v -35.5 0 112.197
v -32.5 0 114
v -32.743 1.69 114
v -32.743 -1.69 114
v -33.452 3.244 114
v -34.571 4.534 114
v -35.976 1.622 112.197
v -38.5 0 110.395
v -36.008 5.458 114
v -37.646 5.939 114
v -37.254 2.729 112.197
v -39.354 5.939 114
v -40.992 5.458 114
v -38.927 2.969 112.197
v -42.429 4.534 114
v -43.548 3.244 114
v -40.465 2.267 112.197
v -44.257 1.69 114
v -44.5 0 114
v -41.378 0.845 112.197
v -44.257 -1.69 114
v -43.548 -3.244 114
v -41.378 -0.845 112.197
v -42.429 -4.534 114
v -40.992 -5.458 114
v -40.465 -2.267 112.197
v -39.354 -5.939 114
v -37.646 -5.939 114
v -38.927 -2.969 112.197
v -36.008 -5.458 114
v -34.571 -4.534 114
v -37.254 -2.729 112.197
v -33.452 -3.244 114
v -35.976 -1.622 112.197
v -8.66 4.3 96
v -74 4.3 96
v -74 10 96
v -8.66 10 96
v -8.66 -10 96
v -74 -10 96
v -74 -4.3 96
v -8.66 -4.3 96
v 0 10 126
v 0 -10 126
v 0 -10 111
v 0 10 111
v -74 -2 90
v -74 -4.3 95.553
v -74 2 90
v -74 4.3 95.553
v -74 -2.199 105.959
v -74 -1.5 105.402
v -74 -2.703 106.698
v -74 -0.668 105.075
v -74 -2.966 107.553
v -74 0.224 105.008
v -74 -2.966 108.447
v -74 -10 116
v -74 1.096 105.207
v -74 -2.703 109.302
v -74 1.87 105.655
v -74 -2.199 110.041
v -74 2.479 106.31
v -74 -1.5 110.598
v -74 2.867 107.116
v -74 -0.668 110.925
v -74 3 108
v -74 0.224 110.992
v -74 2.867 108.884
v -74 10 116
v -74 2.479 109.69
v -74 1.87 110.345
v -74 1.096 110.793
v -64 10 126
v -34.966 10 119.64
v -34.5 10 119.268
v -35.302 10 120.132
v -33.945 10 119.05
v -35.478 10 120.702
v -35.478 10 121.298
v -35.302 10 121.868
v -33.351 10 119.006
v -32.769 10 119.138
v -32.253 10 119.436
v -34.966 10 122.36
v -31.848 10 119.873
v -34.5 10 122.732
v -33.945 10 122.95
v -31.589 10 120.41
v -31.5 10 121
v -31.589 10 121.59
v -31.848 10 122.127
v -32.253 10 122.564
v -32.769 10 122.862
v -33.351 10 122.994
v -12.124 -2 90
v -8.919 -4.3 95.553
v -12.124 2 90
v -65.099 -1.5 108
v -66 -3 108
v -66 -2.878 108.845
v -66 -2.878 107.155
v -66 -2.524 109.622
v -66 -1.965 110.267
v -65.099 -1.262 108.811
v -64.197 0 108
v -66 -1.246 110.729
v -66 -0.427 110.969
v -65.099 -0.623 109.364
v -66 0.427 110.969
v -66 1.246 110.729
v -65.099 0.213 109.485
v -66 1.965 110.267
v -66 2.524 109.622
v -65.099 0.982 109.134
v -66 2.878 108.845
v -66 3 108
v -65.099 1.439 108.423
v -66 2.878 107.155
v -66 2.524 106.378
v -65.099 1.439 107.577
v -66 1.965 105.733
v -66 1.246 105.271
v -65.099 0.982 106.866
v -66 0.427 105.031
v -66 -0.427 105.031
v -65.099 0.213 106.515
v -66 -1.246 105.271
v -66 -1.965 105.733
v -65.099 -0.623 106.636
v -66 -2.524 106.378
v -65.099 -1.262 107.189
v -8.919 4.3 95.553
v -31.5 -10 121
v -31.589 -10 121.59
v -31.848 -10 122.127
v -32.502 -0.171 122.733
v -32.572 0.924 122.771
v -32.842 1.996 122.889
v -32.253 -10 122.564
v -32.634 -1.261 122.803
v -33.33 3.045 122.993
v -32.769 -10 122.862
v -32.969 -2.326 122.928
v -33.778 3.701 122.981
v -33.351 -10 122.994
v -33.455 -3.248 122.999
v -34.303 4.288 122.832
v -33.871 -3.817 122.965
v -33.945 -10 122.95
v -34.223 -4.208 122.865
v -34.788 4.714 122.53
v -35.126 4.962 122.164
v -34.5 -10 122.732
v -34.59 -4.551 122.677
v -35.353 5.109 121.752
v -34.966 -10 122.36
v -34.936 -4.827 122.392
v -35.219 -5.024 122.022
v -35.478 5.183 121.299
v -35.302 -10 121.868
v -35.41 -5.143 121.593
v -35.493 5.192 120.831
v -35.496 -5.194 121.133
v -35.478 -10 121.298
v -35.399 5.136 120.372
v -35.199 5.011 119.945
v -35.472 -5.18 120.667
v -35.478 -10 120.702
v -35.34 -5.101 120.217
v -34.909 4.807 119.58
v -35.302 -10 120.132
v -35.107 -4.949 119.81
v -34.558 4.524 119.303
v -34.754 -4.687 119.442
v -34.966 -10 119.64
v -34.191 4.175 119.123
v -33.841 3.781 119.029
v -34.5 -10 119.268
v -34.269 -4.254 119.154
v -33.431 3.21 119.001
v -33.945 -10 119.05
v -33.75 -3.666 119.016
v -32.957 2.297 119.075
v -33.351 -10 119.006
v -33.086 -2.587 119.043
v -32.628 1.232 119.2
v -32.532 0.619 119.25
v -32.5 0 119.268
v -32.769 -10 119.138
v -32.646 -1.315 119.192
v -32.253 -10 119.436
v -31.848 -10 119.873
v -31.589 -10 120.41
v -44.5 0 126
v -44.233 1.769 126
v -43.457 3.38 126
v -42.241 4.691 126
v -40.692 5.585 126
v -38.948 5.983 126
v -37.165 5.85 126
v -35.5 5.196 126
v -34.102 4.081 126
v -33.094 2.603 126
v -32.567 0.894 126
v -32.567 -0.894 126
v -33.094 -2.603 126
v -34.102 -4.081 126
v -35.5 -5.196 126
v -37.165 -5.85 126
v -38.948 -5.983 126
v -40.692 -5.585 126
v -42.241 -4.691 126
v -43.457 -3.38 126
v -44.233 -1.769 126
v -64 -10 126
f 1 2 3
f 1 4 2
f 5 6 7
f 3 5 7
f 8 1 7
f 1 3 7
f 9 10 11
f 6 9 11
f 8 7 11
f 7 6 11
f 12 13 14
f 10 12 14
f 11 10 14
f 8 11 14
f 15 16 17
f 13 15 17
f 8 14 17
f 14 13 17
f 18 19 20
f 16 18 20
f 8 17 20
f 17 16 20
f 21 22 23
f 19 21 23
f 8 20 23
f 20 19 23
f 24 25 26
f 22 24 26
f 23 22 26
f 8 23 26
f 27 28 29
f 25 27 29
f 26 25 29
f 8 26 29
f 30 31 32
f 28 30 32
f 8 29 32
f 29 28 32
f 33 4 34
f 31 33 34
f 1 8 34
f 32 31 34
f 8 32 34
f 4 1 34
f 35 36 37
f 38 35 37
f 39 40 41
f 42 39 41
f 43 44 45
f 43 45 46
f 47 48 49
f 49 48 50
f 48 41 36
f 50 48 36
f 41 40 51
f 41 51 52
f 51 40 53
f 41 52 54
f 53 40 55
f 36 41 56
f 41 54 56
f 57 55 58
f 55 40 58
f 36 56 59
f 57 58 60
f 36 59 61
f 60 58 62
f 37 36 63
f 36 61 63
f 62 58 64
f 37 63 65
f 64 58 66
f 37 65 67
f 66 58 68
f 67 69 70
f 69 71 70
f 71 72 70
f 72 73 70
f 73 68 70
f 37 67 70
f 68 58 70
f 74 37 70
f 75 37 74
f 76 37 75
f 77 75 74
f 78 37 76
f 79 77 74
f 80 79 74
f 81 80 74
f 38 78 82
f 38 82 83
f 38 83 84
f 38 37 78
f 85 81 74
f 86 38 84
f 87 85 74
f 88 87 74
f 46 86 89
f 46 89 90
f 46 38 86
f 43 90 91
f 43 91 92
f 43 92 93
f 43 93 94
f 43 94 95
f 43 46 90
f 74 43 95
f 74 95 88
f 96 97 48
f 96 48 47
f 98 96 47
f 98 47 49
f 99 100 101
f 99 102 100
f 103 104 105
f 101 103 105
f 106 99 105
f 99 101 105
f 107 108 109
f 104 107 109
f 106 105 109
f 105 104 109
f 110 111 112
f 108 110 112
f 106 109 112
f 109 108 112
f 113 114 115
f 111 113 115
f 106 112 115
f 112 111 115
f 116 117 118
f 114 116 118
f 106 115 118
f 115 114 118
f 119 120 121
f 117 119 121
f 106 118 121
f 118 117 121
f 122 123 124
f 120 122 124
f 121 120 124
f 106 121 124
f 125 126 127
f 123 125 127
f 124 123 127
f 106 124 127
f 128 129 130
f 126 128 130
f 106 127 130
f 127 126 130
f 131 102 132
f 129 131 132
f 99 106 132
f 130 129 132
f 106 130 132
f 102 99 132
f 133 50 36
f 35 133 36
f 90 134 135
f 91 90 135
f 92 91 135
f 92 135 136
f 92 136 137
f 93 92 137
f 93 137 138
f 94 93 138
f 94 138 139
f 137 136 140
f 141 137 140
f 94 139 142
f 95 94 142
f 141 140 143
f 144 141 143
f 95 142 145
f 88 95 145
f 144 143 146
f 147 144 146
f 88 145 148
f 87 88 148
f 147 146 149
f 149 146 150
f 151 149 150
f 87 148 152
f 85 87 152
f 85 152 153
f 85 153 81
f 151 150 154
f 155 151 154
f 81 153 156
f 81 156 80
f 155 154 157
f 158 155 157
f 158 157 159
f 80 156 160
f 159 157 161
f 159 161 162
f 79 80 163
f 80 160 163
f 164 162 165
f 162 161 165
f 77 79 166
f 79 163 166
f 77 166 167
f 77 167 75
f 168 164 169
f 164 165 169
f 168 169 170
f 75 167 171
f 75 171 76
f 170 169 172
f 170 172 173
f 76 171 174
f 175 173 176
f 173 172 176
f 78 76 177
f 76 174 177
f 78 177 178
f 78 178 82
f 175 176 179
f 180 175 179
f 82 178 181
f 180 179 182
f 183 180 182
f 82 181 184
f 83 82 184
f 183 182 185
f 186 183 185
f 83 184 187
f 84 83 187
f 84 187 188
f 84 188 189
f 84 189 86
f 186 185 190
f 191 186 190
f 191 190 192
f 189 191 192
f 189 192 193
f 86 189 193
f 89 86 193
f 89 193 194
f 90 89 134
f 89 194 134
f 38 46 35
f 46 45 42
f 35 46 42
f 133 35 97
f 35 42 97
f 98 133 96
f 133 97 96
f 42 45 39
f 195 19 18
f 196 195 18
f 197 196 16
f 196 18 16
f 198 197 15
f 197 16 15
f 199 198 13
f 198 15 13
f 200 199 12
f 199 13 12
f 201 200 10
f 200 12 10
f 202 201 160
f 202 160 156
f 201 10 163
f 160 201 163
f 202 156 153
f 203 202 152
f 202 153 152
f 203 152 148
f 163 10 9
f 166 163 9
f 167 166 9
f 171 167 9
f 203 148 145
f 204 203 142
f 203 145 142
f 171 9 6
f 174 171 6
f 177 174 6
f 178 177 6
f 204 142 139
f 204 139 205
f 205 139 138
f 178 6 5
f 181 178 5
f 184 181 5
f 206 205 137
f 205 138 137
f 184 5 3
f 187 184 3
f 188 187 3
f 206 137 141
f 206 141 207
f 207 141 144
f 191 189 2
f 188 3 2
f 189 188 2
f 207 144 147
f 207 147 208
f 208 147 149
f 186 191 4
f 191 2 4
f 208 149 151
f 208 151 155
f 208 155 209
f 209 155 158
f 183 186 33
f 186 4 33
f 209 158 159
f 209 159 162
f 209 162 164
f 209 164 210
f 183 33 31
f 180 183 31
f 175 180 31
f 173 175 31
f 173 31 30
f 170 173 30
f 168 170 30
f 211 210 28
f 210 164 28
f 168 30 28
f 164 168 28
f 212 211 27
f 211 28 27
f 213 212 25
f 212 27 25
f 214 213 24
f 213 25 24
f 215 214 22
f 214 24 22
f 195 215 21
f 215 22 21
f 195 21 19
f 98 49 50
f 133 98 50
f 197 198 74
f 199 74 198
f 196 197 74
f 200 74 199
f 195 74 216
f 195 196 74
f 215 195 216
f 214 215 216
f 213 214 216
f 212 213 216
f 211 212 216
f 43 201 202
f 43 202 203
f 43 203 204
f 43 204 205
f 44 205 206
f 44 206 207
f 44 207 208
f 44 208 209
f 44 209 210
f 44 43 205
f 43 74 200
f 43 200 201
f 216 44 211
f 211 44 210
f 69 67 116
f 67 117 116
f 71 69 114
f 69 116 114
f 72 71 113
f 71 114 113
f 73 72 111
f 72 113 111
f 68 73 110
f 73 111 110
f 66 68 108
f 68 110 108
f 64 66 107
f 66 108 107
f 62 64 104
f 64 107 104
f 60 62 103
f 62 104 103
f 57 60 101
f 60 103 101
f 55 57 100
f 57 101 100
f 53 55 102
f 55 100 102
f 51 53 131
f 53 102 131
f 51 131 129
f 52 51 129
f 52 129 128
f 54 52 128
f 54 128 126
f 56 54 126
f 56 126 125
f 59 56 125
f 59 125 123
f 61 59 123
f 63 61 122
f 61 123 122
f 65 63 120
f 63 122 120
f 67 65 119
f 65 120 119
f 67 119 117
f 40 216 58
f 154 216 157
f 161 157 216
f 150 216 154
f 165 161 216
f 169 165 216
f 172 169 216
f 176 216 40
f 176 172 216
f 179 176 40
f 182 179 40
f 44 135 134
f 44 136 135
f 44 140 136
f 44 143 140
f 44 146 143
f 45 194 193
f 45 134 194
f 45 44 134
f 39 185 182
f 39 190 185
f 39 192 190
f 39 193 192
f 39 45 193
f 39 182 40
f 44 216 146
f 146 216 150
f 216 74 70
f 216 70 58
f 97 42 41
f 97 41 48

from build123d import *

# Parameters (mm, degrees)
F1_DEPTH     = 11.5
F3_DEPTH     = 5
F5_D         = 14
F5_DEPTH     = 36
F5_TIP       = 4.2060243332
F7_D         = 6.8
F7_DEPTH     = 17
F7_TIP       = 2.0429261047
F8_SIZE2     = 9.237604307
F8_SIZE      = 16
F8_2_SIZE2   = 9.237604307
F8_2_SIZE    = 16
F9_T1_DEPTH  = 23
F9_T6_DEPTH  = 84.5247913859
F9_T12_DEPTH = 98.4752086141
F9_T18_DEPTH = 98.4752086141
F9_T25_DEPTH = 98.4752086141
F9_T32_DEPTH = 98.4752086141
F9_T38_DEPTH = 98.4752086141
F9_T44_DEPTH = 98.4752086141
F9_T51_DEPTH = 98.4752086141
F9_T58_DEPTH = 98.4752086141
F11_DEPTH    = 74
F13_DEPTH    = 20
F14_SIZE2    = 10
F14_SIZE     = 10
F16_D        = 12
F16_DEPTH    = 12
F16_TIP      = 3.6051637142
F17_R        = 2
F18_DEPTH    = 20
F21_D        = 6
F21_DEPTH    = 8
F21_TIP      = 1.8025818571


# Not quite as in the source:
# - a fillet or chamfer that OpenCascade refuses, or shapes differently, is made with other operations: its cross-section is extruded or revolved along the edge and cut away or added


with BuildPart() as f1:
    # F0 (on Front) → F1 (new body, symmetric)
    with BuildSketch(Plane.XZ):
        Polygon((-200, 0), (0, 0), (0, 40), (-63, 40), (-63, 155), (0, 155), (0, 185), (-90, 185), (-200, 30), align=None)
    extrude(amount=F1_DEPTH, both=True)

    # F2 (on face) → F3 (cut)
    with BuildSketch(Plane.YZ.offset(-63)):
        with BuildLine():
            ThreePointArc((3.5, 135), (0, 138.5), (-3.5, 135))
            Line((-3.5, 135), (-3.5, 67))
            ThreePointArc((-3.5, 67), (0, 63.5), (3.5, 67))
            Line((3.5, 67), (3.5, 135))
        make_face()
    extrude(amount=-F3_DEPTH, mode=Mode.SUBTRACT)

    # F5
    with Locations(Plane.XY.offset(185)):
        with Locations((-20, 0)):
            Hole(F5_D / 2, depth=F5_DEPTH)
            with Locations((0, 0, -(F5_DEPTH + F5_TIP / 2))):  # 118° drill point
                Cone(0, F5_D / 2, F5_TIP, mode=Mode.SUBTRACT)

    # F7
    with Locations(Plane(origin=(0, 0, 0), x_dir=(1, 0, 0), z_dir=(0, 0, -1))):
        with Locations((-175, 0), (-125, 0), (-75, 0), (-25, 0)):
            Hole(F7_D / 2, depth=F7_DEPTH)
            with Locations((0, 0, -(F7_DEPTH + F7_TIP / 2))):  # 118° drill point
                Cone(0, F7_D / 2, F7_TIP, mode=Mode.SUBTRACT)

    # F8
    f8_edges = [f1.edges().sort_by_distance(p)[0] for p in [
        (-31.5, -11.5, 40),
    ]]
    f8_side = f1.faces().sort_by_distance((-97.944693, -11.5, 74.396883))[0]
    chamfer(f8_edges, length=F8_SIZE, length2=F8_SIZE2, reference=f8_side)

    # F8#2
    f8_2_edges = [f1.edges().sort_by_distance(p)[0] for p in [
        (-31.5, 11.5, 40),
    ]]
    f8_2_side = f1.faces().sort_by_distance((-97.944693, 11.5, 74.396883))[0]
    chamfer(f8_2_edges, length=F8_2_SIZE, length2=F8_2_SIZE2, reference=f8_2_side)

    # F9: fillet of radius 16 on 4 edges, made by hand

    # F9_s2 → F9_t1 (join)
    with BuildSketch(Plane.XZ.offset(-11.5)):
        with BuildLine():
            ThreePointArc((-63, 139), (-58.313708499, 150.313708499), (-47, 155))
            Line((-47, 155), (-63, 155))
            Line((-63, 155), (-63, 139))
        make_face()
    extrude(amount=F9_T1_DEPTH)


with BuildPart() as f9_tool4:
    # F9_s5 → F9_t6 (new body)
    with BuildSketch(Plane.XZ.offset(-42.262395693)):
        with BuildLine():
            ThreePointArc((-47, 40), (-58.313708499, 44.686291501), (-63, 56))
            Line((-63, 56), (-63, 40))
            Line((-63, 40), (-47, 40))
        make_face()
    extrude(amount=F9_T6_DEPTH)

    split(bisect_by=Plane.XZ.offset(-11.5), keep=Keep.TOP)

    split(bisect_by=Plane.XZ.offset(11.5), keep=Keep.BOTTOM)


with BuildPart() as f1_1:
    add(f1.part)

    # F9_t3: union F9_tool4
    add(f9_tool4.part)


with BuildPart() as f9_tool10:
    # F9_s11 → F9_t12 (new body)
    with BuildSketch(Plane(origin=(0, -12.4826951546, -21.6206622231), x_dir=(1, 0, 0), z_dir=(0, 0.5, 0.8660254038))):
        with BuildLine():
            ThreePointArc((-47, -21.9592921435), (-58.313708499, -26.6455836445), (-63, -37.9592921435))
            Line((-63, -37.9592921435), (-63, -21.9592921435))
            Line((-63, -21.9592921435), (-47, -21.9592921435))
        make_face()
    extrude(amount=F9_T12_DEPTH)

    split(bisect_by=Plane.XY.offset(40), keep=Keep.BOTTOM)

    split(bisect_by=Plane.XZ.offset(11.5), keep=Keep.TOP)


with BuildPart() as f1_2:
    add(f1_1.part)

    # F9_t9: union F9_tool10
    add(f9_tool10.part)


with BuildPart() as f9_tool16:
    # F9_s17 → F9_t18 (new body)
    with BuildSketch(Plane(origin=(0, -12.4826951546, -21.6206622231), x_dir=(1, 0, 0), z_dir=(0, 0.5, 0.8660254038))):
        with BuildLine():
            ThreePointArc((-47, -21.9592921435), (-58.313708499, -26.6455836445), (-63, -37.9592921435))
            Line((-63, -37.9592921435), (-63, -21.9592921435))
            Line((-63, -21.9592921435), (-47, -21.9592921435))
        make_face()
    extrude(amount=F9_T18_DEPTH)

    split(bisect_by=Plane.XY.offset(40), keep=Keep.BOTTOM)

    split(bisect_by=Plane.XZ.offset(11.5), keep=Keep.BOTTOM)

    split(bisect_by=Plane.XZ.offset(3.5), keep=Keep.TOP)


with BuildPart() as f1_3:
    add(f1_2.part)

    # F9_t15: union F9_tool16
    add(f9_tool16.part)


with BuildPart() as f9_tool23:
    # F9_s24 → F9_t25 (new body)
    with BuildSketch(Plane(origin=(0, -12.4826951546, -21.6206622231), x_dir=(1, 0, 0), z_dir=(0, 0.5, 0.8660254038))):
        with BuildLine():
            ThreePointArc((-47, -21.9592921435), (-58.313708499, -26.6455836445), (-63, -37.9592921435))
            Line((-63, -37.9592921435), (-63, -21.9592921435))
            Line((-63, -21.9592921435), (-47, -21.9592921435))
        make_face()
    extrude(amount=F9_T25_DEPTH)

    split(bisect_by=Plane.XY.offset(40), keep=Keep.TOP)

    split(bisect_by=Plane.XZ.offset(11.5), keep=Keep.BOTTOM)

    split(bisect_by=Plane.XZ.offset(3.5), keep=Keep.TOP)


with BuildPart() as f1_4:
    add(f1_3.part)

    # F9_t22: union F9_tool23
    add(f9_tool23.part)


with BuildPart() as f9_tool30:
    # F9_s31 → F9_t32 (new body)
    with BuildSketch(Plane(origin=(0, -12.4826951546, -21.6206622231), x_dir=(1, 0, 0), z_dir=(0, 0.5, 0.8660254038))):
        with BuildLine():
            ThreePointArc((-47, -21.9592921435), (-58.313708499, -26.6455836445), (-63, -37.9592921435))
            Line((-63, -37.9592921435), (-63, -21.9592921435))
            Line((-63, -21.9592921435), (-47, -21.9592921435))
        make_face()
    extrude(amount=F9_T32_DEPTH)

    split(bisect_by=Plane.XY.offset(40), keep=Keep.BOTTOM)

    split(bisect_by=Plane.XZ.offset(3.5), keep=Keep.BOTTOM)


with BuildPart() as f1_5:
    add(f1_4.part)

    # F9_t29: union F9_tool30
    add(f9_tool30.part)


with BuildPart() as f9_tool36:
    # F9_s37 → F9_t38 (new body)
    with BuildSketch(Plane(origin=(0, 12.4826951546, -21.6206622231), x_dir=(1, 0, 0), z_dir=(0, -0.5, 0.8660254038))):
        with BuildLine():
            ThreePointArc((-47, 21.9592921435), (-58.313708499, 26.6455836445), (-63, 37.9592921435))
            Line((-63, 37.9592921435), (-63, 21.9592921435))
            Line((-63, 21.9592921435), (-47, 21.9592921435))
        make_face()
    extrude(amount=F9_T38_DEPTH)

    split(bisect_by=Plane.XY.offset(40), keep=Keep.BOTTOM)

    split(bisect_by=Plane.XZ.offset(-11.5), keep=Keep.BOTTOM)


with BuildPart() as f1_6:
    add(f1_5.part)

    # F9_t35: union F9_tool36
    add(f9_tool36.part)


with BuildPart() as f9_tool42:
    # F9_s43 → F9_t44 (new body)
    with BuildSketch(Plane(origin=(0, 12.4826951546, -21.6206622231), x_dir=(1, 0, 0), z_dir=(0, -0.5, 0.8660254038))):
        with BuildLine():
            ThreePointArc((-47, 21.9592921435), (-58.313708499, 26.6455836445), (-63, 37.9592921435))
            Line((-63, 37.9592921435), (-63, 21.9592921435))
            Line((-63, 21.9592921435), (-47, 21.9592921435))
        make_face()
    extrude(amount=F9_T44_DEPTH)

    split(bisect_by=Plane.XY.offset(40), keep=Keep.BOTTOM)

    split(bisect_by=Plane.XZ.offset(-11.5), keep=Keep.TOP)

    split(bisect_by=Plane.XZ.offset(-3.5), keep=Keep.BOTTOM)


with BuildPart() as f1_7:
    add(f1_6.part)

    # F9_t41: union F9_tool42
    add(f9_tool42.part)


with BuildPart() as f9_tool49:
    # F9_s50 → F9_t51 (new body)
    with BuildSketch(Plane(origin=(0, 12.4826951546, -21.6206622231), x_dir=(1, 0, 0), z_dir=(0, -0.5, 0.8660254038))):
        with BuildLine():
            ThreePointArc((-47, 21.9592921435), (-58.313708499, 26.6455836445), (-63, 37.9592921435))
            Line((-63, 37.9592921435), (-63, 21.9592921435))
            Line((-63, 21.9592921435), (-47, 21.9592921435))
        make_face()
    extrude(amount=F9_T51_DEPTH)

    split(bisect_by=Plane.XY.offset(40), keep=Keep.TOP)

    split(bisect_by=Plane.XZ.offset(-11.5), keep=Keep.TOP)

    split(bisect_by=Plane.XZ.offset(-3.5), keep=Keep.BOTTOM)


with BuildPart() as f1_8:
    add(f1_7.part)

    # F9_t48: union F9_tool49
    add(f9_tool49.part)


with BuildPart() as f9_tool56:
    # F9_s57 → F9_t58 (new body)
    with BuildSketch(Plane(origin=(0, 12.4826951546, -21.6206622231), x_dir=(1, 0, 0), z_dir=(0, -0.5, 0.8660254038))):
        with BuildLine():
            ThreePointArc((-47, 21.9592921435), (-58.313708499, 26.6455836445), (-63, 37.9592921435))
            Line((-63, 37.9592921435), (-63, 21.9592921435))
            Line((-63, 21.9592921435), (-47, 21.9592921435))
        make_face()
    extrude(amount=F9_T58_DEPTH)

    split(bisect_by=Plane.XY.offset(40), keep=Keep.BOTTOM)

    split(bisect_by=Plane.XZ.offset(-3.5), keep=Keep.TOP)


with BuildPart() as f1_9:
    add(f1_8.part)

    # F9_t55: union F9_tool56
    add(f9_tool56.part)


with BuildPart() as f11:
    # F10 (on Right) → F11 (new body)
    with BuildSketch(Plane.YZ):
        Polygon((-2, 90), (0, 90), (2, 90), (4.3, 95.5526911935), (4.3, 96), (10, 96), (10, 126), (0, 126), (-10, 126), (-10, 96), (-4.3, 96), (-4.3, 95.5526911935), align=None)
    extrude(amount=-F11_DEPTH)

    # F12 (on face) → F13 (cut, through all)
    with BuildSketch(Plane.XZ.offset(10)):
        Polygon((0, 90), (0, 111), (-12.124355653, 90), align=None)
    extrude(amount=-F13_DEPTH, mode=Mode.SUBTRACT)

    # F14
    f14_edges = [f11.edges().sort_by_distance(p)[0] for p in [
        (-74, 0, 126),
    ]]
    chamfer(f14_edges, length=F14_SIZE, length2=F14_SIZE2)

    # F16
    with Locations(Plane.XY.offset(126)):
        with Locations((-38.5, 0)):
            Hole(F16_D / 2, depth=F16_DEPTH)
            with Locations((0, 0, -(F16_DEPTH + F16_TIP / 2))):  # 118° drill point
                Cone(0, F16_D / 2, F16_TIP, mode=Mode.SUBTRACT)

    # F17 (on face) → F18 (cut, through all)
    with BuildSketch(Plane.XZ.offset(10)):
        with Locations((-33.5, 121)):
            Circle(F17_R)
    extrude(amount=-F18_DEPTH, mode=Mode.SUBTRACT)

    # F21
    with Locations(Plane(origin=(-74, 0, 0), x_dir=(0, -1, 0), z_dir=(-1, 0, 0))):
        with Locations((0, 108)):
            Hole(F21_D / 2, depth=F21_DEPTH)
            with Locations((0, 0, -(F21_DEPTH + F21_TIP / 2))):  # 118° drill point
                Cone(0, F21_D / 2, F21_TIP, mode=Mode.SUBTRACT)


solid = f11.part
